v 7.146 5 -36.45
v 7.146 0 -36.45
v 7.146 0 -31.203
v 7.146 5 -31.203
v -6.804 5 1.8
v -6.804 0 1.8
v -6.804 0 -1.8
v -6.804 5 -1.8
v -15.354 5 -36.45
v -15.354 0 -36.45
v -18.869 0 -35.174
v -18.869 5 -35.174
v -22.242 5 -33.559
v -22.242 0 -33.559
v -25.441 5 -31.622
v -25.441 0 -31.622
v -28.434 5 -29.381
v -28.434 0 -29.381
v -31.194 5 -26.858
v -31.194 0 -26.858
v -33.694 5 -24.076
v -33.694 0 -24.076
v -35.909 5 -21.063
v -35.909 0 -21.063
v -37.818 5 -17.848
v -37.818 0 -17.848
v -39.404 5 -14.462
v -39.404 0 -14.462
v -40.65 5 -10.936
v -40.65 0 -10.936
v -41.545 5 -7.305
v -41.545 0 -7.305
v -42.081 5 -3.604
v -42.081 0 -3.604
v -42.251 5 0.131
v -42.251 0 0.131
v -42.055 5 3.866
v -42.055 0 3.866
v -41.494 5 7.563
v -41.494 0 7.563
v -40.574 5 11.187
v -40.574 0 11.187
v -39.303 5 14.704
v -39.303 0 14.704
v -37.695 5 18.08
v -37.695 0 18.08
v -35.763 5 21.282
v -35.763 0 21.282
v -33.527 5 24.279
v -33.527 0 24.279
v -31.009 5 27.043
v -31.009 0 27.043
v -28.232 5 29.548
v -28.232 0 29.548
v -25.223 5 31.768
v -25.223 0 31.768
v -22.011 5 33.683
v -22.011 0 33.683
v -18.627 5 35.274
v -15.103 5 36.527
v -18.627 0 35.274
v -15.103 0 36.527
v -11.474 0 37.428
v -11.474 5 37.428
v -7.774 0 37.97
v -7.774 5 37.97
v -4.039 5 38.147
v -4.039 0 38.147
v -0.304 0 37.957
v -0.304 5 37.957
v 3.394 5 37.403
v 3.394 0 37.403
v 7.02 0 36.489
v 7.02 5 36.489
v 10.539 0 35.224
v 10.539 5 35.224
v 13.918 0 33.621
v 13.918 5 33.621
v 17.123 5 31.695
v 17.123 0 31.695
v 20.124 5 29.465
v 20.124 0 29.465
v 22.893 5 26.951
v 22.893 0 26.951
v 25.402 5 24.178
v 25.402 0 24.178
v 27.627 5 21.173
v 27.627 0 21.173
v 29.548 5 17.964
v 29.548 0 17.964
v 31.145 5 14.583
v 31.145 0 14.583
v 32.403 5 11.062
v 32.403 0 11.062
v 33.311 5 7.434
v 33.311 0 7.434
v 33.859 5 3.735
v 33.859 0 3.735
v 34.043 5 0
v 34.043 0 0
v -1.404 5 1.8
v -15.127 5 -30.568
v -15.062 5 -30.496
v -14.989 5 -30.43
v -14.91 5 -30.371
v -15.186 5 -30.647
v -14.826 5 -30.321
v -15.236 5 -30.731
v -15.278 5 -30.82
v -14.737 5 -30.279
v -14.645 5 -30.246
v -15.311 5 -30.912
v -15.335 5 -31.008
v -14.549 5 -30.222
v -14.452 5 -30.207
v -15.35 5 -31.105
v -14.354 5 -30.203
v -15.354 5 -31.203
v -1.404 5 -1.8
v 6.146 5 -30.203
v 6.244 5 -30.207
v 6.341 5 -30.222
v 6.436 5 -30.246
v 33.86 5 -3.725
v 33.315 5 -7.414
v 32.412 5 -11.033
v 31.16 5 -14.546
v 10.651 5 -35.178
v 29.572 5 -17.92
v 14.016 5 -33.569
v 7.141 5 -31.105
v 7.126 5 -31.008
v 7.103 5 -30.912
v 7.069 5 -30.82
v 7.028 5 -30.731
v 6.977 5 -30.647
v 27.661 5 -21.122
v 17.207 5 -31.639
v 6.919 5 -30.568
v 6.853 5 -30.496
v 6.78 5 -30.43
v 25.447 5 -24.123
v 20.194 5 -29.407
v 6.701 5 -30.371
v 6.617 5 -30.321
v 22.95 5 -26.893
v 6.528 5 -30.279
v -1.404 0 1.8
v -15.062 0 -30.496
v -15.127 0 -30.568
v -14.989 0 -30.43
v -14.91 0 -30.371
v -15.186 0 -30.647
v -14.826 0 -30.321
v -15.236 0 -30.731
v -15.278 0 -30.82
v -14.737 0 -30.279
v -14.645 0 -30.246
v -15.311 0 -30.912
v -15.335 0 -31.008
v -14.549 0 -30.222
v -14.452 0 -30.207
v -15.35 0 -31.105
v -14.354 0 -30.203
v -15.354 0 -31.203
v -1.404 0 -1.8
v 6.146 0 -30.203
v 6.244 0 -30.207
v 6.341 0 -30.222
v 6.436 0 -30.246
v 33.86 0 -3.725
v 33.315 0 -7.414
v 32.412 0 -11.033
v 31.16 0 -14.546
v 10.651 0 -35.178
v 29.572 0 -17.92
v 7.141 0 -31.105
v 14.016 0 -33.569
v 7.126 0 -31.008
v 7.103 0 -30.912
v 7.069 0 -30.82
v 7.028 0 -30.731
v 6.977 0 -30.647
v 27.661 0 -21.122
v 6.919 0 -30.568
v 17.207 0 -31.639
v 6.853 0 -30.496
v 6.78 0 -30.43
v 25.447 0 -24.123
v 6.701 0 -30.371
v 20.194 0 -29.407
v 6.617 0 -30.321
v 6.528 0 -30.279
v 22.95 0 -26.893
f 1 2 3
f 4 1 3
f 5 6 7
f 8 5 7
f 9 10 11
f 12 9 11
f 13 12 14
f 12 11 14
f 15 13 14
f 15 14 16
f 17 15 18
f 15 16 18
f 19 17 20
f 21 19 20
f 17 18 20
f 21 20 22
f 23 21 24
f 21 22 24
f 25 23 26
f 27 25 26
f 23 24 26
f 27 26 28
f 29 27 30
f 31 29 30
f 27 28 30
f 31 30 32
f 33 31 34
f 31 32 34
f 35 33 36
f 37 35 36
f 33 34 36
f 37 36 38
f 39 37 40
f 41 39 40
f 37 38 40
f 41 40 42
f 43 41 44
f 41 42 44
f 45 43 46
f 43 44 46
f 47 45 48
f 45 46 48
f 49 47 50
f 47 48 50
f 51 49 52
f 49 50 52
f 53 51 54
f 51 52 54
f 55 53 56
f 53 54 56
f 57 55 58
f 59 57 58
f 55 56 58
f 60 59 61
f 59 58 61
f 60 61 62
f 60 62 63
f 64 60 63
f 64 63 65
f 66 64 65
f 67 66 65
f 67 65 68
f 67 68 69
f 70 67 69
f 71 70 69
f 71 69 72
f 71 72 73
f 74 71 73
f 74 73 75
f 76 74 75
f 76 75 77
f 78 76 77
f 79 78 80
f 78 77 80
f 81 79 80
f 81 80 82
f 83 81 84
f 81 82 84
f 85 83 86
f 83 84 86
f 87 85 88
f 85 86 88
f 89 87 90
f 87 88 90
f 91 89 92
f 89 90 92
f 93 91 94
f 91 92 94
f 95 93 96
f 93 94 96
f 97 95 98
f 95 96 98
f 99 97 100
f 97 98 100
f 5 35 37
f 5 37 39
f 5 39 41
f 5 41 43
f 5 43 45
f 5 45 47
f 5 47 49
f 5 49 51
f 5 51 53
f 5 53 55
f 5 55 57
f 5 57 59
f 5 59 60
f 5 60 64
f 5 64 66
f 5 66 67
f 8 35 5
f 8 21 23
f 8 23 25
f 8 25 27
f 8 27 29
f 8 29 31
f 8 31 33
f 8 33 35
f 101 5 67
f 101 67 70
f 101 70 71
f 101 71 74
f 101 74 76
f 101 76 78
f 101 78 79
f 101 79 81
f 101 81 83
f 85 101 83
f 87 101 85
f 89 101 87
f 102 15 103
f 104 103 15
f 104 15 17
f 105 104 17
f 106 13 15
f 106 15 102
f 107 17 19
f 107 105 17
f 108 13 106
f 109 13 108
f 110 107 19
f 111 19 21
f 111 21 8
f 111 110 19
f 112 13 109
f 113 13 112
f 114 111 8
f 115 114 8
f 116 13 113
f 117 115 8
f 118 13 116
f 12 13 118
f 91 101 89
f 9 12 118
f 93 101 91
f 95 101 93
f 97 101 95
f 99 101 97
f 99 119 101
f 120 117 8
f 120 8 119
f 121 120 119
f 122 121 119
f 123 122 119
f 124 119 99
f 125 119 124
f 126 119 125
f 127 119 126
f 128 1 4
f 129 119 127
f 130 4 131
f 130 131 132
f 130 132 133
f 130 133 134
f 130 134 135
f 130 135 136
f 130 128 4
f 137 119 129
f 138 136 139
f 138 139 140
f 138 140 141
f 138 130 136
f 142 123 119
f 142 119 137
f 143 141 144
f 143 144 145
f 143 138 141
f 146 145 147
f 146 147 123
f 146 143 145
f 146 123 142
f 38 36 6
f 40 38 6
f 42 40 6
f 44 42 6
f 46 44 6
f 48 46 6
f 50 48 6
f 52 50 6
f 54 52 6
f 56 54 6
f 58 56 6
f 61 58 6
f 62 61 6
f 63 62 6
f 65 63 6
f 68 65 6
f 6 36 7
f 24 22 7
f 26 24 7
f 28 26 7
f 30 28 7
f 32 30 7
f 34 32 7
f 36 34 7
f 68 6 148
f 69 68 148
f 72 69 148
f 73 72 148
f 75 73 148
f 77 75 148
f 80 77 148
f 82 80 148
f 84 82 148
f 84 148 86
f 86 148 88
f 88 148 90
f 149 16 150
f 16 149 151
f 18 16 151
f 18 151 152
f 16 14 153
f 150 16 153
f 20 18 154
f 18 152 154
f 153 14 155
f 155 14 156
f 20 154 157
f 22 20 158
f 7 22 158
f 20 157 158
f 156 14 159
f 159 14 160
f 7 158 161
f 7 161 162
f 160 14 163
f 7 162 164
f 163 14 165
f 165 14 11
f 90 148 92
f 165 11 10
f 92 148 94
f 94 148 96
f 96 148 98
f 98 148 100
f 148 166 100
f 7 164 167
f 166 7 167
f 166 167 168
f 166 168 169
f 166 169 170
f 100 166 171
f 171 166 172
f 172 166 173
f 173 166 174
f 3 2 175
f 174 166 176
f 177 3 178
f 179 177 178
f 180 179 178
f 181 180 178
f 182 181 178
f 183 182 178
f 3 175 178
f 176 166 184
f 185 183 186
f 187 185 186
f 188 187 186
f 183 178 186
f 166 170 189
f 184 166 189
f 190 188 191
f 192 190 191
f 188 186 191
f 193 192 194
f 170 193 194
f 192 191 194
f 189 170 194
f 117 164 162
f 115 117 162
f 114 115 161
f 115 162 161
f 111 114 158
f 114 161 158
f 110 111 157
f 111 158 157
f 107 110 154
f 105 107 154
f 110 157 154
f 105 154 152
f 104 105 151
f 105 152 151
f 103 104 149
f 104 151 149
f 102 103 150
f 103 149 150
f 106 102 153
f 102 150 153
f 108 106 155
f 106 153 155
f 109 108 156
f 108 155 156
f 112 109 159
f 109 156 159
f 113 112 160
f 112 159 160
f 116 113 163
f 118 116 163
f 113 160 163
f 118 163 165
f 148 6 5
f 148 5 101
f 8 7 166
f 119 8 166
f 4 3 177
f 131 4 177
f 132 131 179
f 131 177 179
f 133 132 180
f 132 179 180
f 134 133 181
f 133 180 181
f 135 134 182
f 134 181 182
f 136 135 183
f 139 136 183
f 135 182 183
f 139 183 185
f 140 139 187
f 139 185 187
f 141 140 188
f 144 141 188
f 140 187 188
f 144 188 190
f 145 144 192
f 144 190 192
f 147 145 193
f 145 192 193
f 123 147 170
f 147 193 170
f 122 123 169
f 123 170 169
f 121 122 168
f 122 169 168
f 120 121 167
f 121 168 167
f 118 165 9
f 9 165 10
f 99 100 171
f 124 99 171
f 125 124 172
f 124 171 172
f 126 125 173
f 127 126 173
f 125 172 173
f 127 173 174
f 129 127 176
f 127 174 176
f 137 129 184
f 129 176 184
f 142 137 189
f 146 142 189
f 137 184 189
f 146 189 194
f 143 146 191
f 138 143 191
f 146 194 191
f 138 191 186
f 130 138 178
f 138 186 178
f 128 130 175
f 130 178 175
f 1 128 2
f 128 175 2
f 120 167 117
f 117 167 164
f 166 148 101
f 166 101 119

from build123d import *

# Parameters (mm, degrees)
SKETCH1_W           = 5.4
SKETCH1_H           = 3.6
BOSS_EXTRUDE1_DEPTH = 5


with BuildPart() as part:
    # Sketch1 → Boss-Extrude1 (new body)
    with BuildSketch(Plane(origin=(0, 0, 0), x_dir=(1, 0, 0), z_dir=(0, 1, 0))):
        with BuildLine():
            ThreePointArc((34.042513552, 0), (26.590386774, 22.649879577), (7.14560225, 36.450299612))
            Line((7.14560225, 36.450299612), (7.14560225, 31.202638223))
            ThreePointArc((7.14560225, 31.202638223), (6.852709032, 30.495531442), (6.14560225, 30.202638223))
            Line((6.14560225, 30.202638223), (-14.35439775, 30.202638223))
            ThreePointArc((-14.35439775, 30.202638223), (-15.061504531, 30.495531442), (-15.35439775, 31.202638223))
            Line((-15.35439775, 31.202638223), (-15.35439775, 36.450299612))
            ThreePointArc((-15.35439775, 36.450299612), (-26.754277326, -30.694784524), (34.042513552, 0))
        make_face()
        with Locations((-4.10439775, 0)):
            Rectangle(SKETCH1_W, SKETCH1_H, mode=Mode.SUBTRACT)
    extrude(amount=BOSS_EXTRUDE1_DEPTH)


solid = part.part
